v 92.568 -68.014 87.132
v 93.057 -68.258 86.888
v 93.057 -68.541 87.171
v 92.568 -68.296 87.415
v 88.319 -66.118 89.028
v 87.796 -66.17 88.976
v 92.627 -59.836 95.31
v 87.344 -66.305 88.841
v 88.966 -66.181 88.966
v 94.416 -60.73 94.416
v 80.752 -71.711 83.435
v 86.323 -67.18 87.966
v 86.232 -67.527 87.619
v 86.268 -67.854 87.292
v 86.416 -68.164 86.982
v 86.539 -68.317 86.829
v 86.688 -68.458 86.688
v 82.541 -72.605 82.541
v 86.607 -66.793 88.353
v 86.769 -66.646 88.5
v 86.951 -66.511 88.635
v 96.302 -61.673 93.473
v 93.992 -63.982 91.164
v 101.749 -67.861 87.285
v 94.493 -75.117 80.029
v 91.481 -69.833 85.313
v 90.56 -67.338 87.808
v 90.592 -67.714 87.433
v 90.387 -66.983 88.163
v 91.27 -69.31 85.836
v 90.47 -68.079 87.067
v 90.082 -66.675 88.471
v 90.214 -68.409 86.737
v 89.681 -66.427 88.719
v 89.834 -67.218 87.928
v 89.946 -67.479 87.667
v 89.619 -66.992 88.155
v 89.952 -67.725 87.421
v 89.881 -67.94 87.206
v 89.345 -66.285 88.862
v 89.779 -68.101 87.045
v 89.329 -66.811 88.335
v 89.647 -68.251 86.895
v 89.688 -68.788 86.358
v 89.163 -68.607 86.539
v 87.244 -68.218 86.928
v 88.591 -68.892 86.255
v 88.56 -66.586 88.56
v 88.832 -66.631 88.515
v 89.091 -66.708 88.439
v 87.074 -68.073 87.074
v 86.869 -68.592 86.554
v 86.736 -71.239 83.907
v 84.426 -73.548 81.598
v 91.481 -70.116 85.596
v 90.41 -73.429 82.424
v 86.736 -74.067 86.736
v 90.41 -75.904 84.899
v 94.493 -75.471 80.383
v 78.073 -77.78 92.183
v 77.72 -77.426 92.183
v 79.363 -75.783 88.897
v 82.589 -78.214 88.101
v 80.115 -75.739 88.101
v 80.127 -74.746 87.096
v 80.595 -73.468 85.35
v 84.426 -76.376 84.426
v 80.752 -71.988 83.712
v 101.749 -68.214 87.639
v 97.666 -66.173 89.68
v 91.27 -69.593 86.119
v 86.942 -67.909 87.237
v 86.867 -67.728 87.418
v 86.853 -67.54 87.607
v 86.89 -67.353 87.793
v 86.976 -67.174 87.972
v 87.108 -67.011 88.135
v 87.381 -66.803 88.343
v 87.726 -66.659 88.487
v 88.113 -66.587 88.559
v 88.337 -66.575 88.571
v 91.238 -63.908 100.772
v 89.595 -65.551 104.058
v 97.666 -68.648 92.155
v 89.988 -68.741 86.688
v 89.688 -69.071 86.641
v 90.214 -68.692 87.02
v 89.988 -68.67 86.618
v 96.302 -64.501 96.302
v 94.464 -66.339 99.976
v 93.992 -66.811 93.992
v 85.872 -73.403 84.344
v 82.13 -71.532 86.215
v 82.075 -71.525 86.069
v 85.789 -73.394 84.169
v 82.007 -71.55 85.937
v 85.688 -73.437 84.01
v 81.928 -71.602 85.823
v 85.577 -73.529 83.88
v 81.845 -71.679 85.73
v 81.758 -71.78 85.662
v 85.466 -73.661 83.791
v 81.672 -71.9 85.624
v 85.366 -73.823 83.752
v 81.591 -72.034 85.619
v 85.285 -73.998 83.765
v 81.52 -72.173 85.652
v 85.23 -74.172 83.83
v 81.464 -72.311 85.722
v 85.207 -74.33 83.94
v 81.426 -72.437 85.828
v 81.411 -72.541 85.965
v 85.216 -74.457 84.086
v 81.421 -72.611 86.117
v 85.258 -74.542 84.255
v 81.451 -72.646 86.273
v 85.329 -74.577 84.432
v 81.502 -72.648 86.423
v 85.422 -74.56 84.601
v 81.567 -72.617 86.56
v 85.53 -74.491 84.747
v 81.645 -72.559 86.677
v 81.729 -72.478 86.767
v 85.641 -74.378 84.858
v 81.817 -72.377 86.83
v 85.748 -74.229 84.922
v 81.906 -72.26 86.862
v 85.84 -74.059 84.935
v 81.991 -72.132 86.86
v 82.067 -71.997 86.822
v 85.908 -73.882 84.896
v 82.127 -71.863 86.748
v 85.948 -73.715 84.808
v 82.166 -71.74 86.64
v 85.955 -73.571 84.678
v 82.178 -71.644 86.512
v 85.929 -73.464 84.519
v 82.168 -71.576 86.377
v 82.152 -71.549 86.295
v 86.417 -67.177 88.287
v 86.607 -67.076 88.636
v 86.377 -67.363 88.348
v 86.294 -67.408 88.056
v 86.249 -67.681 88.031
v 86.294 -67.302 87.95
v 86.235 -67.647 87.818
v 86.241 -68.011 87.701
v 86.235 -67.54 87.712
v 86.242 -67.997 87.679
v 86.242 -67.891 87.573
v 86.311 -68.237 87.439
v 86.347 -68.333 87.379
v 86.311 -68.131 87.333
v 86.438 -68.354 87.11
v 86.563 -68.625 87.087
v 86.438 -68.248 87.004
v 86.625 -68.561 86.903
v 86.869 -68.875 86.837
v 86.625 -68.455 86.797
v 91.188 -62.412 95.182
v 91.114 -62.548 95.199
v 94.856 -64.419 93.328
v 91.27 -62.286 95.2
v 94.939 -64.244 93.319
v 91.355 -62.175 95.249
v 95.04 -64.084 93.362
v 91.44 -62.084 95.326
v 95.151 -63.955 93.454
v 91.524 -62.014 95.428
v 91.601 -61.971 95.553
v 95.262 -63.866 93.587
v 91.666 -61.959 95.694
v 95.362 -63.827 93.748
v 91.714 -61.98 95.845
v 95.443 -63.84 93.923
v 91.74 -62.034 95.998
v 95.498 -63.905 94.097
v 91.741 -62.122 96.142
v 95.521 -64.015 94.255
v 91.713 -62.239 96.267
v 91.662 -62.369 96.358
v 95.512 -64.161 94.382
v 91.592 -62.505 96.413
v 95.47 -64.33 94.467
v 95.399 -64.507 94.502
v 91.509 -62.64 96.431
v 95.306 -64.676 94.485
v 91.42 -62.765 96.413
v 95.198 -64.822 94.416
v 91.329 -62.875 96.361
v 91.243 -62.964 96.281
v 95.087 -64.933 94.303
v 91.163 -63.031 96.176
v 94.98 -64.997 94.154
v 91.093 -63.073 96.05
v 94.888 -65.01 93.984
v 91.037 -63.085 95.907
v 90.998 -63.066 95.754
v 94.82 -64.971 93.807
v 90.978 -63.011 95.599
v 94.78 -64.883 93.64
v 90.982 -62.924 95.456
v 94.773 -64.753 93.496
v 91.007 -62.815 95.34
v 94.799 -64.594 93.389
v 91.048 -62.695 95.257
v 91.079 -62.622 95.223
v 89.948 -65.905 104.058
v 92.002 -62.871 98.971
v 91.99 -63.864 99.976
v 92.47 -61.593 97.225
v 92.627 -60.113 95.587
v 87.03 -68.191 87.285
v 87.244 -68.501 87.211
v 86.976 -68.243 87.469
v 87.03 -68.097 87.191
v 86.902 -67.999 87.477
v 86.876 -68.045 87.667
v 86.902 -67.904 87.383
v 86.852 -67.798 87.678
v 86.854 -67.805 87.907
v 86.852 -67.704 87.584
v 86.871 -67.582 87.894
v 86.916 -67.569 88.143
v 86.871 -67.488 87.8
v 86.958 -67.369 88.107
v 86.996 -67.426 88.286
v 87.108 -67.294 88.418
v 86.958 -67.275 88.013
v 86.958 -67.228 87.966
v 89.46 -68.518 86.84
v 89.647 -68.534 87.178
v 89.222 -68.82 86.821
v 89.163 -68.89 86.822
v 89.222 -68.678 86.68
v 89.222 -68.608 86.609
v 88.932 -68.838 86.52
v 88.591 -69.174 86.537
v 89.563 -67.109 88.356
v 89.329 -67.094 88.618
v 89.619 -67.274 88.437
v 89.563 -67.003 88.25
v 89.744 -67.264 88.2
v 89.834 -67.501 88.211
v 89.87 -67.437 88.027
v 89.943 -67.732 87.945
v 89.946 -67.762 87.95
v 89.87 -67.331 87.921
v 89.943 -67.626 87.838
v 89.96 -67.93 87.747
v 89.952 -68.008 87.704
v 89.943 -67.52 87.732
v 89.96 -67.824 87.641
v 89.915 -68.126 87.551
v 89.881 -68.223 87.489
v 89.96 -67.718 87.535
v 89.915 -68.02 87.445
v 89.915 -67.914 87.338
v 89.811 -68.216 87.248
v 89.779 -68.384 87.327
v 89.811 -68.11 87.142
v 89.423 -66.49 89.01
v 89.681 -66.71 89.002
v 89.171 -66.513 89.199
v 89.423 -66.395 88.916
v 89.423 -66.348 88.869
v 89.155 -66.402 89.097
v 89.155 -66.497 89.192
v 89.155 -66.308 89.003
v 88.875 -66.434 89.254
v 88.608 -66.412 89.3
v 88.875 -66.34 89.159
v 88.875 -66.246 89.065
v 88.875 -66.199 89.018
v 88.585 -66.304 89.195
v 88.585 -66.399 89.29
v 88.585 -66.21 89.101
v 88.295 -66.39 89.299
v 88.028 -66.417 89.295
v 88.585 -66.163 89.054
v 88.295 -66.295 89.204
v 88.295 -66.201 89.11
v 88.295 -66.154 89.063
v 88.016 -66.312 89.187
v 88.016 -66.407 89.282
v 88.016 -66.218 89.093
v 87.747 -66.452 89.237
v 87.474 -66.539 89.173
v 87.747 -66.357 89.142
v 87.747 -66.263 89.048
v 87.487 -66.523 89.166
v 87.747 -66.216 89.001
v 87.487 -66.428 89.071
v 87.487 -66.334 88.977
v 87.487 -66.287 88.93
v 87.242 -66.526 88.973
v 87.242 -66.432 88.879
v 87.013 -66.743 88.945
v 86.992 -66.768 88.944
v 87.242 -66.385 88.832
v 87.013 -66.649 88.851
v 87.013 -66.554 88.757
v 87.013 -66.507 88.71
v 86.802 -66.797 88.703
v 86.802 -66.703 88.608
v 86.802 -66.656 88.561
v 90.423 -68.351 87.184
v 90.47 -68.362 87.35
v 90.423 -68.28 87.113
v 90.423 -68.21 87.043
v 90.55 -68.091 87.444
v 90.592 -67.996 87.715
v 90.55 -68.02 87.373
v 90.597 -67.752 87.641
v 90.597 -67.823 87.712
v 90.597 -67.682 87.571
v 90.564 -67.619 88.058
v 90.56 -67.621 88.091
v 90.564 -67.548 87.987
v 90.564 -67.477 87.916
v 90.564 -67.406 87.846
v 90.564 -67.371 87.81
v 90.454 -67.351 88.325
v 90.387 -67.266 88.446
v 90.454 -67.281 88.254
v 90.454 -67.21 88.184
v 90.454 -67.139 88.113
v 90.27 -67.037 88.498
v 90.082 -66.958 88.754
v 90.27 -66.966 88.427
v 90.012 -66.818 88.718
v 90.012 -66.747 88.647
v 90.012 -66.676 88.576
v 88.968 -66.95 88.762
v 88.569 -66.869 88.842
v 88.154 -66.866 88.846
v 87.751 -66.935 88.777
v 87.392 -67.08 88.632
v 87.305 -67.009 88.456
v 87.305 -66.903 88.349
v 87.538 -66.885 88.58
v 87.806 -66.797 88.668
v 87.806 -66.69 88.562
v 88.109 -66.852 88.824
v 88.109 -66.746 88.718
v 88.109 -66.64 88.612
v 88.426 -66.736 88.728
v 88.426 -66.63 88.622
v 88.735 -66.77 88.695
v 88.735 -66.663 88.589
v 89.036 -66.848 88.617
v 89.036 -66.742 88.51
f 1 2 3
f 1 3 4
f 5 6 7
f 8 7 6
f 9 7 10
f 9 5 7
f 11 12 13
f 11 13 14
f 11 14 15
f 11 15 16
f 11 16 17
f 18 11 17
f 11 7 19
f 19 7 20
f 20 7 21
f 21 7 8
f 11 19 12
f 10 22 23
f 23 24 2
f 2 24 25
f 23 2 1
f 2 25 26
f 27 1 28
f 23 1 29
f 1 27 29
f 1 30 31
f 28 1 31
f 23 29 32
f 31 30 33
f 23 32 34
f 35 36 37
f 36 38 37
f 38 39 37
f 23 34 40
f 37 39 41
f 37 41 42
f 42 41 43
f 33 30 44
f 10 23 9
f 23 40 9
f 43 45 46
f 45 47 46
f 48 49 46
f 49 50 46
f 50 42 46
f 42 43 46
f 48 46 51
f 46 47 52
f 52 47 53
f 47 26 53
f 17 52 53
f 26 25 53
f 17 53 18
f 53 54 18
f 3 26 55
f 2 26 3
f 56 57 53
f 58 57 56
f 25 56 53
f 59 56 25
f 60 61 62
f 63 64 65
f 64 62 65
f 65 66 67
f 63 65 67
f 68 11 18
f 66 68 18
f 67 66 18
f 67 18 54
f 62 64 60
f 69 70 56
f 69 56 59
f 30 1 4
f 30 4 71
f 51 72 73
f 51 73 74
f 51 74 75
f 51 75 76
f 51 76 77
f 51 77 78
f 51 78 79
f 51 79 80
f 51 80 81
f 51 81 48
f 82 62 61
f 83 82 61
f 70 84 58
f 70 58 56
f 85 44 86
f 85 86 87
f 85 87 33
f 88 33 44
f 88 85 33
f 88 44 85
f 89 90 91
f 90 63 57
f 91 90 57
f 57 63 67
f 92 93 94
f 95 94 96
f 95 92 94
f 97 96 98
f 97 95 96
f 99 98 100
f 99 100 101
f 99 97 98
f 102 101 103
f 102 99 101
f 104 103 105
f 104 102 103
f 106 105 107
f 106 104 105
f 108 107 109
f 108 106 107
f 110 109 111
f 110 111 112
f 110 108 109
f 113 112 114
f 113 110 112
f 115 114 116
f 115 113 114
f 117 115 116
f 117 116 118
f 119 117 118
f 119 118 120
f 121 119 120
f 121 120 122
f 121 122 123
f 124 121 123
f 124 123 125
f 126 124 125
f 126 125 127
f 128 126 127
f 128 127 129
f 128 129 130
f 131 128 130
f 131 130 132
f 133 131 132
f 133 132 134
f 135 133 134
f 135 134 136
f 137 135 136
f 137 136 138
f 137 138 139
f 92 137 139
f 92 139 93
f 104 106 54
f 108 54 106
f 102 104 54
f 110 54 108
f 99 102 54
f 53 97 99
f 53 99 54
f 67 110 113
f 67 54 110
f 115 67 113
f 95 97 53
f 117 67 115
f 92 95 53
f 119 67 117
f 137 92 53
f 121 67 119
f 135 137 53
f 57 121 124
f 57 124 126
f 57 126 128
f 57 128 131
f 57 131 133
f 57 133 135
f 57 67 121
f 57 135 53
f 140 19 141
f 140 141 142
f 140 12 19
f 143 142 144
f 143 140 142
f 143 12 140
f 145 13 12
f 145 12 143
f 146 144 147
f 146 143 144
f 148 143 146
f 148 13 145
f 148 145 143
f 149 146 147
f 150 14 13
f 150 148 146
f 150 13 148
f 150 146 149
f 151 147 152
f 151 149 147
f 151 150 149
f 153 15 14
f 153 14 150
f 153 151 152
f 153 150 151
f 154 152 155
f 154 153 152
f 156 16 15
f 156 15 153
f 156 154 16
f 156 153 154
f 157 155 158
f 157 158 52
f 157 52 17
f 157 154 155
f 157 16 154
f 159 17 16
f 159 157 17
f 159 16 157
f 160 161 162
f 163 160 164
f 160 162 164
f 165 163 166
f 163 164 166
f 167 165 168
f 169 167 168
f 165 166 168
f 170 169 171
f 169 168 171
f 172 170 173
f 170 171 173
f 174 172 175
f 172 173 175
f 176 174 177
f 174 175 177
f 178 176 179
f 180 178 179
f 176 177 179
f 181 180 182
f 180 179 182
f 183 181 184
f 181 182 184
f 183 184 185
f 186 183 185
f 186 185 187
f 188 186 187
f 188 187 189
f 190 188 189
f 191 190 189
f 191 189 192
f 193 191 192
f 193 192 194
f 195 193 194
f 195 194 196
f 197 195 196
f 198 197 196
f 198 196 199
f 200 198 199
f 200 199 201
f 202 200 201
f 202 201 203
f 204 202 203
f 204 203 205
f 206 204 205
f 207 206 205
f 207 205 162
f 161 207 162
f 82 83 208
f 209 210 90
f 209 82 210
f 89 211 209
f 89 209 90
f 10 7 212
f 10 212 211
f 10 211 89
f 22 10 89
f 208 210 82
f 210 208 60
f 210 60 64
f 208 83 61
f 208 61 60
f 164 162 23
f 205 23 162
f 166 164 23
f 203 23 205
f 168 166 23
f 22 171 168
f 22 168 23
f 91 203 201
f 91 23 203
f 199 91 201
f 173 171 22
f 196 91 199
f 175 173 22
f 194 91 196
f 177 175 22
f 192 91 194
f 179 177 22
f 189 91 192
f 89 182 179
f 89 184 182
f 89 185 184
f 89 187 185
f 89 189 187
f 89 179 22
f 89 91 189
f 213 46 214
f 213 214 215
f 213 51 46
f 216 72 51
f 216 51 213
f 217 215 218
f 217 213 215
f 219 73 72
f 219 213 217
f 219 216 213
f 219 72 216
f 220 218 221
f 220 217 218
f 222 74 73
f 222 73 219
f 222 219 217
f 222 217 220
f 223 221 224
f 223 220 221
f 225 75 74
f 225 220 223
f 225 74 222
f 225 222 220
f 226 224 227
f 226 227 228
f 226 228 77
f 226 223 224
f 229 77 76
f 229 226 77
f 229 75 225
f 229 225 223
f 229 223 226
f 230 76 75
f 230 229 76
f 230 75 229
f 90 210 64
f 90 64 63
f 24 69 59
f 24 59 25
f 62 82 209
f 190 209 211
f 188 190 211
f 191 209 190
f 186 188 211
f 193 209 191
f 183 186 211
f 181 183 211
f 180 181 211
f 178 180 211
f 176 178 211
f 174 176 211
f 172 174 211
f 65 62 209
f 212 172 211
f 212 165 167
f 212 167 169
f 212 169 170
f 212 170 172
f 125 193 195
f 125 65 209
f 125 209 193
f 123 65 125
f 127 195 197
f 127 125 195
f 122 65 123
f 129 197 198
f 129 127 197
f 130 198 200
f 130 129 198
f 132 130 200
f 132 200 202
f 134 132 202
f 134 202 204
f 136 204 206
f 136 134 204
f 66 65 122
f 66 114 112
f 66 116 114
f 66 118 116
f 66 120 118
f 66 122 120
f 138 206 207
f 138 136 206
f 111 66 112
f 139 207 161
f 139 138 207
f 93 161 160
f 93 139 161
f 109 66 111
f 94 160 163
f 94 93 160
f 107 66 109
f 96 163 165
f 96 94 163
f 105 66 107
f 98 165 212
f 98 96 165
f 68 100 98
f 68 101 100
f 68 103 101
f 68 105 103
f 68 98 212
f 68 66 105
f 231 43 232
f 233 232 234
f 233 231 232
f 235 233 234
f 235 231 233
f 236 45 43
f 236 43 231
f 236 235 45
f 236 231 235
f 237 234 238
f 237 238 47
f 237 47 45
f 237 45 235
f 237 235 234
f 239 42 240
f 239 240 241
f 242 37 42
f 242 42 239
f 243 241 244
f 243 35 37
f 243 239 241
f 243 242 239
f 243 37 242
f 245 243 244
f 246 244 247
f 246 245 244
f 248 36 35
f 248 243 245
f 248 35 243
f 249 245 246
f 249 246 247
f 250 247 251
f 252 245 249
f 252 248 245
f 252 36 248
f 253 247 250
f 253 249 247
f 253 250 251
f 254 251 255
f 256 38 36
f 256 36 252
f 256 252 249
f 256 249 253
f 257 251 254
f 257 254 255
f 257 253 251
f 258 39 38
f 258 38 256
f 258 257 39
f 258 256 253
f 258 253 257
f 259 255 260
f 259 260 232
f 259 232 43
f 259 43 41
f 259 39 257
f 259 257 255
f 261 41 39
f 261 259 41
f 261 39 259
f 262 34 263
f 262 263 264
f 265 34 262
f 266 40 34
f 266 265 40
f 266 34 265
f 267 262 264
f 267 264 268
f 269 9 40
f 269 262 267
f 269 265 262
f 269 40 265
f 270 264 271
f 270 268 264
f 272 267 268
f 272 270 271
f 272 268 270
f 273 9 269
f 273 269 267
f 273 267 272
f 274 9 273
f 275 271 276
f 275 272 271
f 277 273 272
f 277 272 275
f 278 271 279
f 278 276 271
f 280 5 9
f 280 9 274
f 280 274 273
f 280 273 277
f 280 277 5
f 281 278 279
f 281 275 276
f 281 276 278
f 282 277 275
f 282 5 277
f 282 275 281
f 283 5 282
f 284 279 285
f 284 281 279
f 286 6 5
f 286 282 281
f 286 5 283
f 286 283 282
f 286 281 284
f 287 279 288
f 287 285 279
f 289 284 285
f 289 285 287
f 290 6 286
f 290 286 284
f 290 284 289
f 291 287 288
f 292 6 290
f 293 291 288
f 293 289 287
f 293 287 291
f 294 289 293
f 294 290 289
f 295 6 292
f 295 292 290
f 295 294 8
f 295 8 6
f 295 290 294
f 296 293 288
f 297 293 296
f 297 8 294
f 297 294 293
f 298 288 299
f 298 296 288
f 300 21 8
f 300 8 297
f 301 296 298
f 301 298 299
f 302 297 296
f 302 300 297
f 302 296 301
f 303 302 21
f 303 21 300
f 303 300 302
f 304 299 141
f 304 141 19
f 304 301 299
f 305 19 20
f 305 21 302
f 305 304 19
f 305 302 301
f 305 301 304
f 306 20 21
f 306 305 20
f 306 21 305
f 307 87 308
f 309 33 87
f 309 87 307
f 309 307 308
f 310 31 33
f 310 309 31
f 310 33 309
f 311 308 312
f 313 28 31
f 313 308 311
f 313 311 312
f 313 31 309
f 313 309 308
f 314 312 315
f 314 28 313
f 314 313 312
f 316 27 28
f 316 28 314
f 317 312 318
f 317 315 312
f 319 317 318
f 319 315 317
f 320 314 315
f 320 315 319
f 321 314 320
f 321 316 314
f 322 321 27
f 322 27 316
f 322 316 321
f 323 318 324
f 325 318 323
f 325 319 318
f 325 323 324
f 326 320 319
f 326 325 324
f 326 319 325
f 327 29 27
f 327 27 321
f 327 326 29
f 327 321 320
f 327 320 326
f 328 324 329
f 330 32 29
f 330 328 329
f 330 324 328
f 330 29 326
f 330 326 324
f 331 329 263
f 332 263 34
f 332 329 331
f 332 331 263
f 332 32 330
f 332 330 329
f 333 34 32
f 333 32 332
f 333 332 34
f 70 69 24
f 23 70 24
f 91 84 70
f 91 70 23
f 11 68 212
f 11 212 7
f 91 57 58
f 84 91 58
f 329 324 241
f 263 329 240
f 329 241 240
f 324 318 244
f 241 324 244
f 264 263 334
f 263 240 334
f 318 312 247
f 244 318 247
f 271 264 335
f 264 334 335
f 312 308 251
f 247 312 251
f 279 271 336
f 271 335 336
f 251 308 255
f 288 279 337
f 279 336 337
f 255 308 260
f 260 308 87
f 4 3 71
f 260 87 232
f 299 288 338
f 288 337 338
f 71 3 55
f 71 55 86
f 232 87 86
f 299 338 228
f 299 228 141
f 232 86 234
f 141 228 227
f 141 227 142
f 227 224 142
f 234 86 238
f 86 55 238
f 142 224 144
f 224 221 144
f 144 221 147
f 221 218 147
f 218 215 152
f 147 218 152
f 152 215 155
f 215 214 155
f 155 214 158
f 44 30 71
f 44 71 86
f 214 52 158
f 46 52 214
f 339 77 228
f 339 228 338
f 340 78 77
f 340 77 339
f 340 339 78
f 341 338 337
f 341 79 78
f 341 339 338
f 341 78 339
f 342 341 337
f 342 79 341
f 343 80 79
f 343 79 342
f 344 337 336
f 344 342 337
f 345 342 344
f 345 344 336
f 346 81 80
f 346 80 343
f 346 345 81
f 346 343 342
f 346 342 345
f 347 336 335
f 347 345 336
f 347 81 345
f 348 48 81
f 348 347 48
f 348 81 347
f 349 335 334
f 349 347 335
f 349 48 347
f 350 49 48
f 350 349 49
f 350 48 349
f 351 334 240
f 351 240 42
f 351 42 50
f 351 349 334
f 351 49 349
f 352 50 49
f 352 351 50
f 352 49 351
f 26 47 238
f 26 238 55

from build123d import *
from build123d.topology import SkipClean

# Parameters (mm, degrees)
STOCK_GOUX_START         = 53.391336338
STOCK_GOUX_LIKED_1_DEPTH = 20.568134432
CUT_EXTRUDE1_DEPTH       = 109.511360444
BOSS_EXTRUDE1_DEPTH      = 20.568134
FILLET1_R                = 12.7
SKETCH3_R                = 0.64999997
CUT_EXTRUDE2_DEPTH       = 149.612005727
CUT_EXTRUDE3_DEPTH       = 0.4


# Read off the part's stored shape, not the designer's step: Stock-Goux Liked-1
with BuildPart() as part:
    # Stock-Goux Liked-1 outline → Stock-Goux Liked-1 (new body)
    with BuildSketch(Plane(origin=(0, 0, 0), x_dir=(0.8164965809277512, -0.4082482904637994, -0.40824829046387656), z_dir=(0.5773502691895902, 0.5773502691895891, 0.5773502691896982)).offset(STOCK_GOUX_START)):
        Polygon((57.433440297, -119.932119095), (57.866453013, -120.182119103), (60.366452966, -115.851992166), (63.397541976, -117.601992222), (65.647541921, -113.704878), (70.147541811, -113.704878), (70.147541811, -110.204877888), (75.147541717, -110.204877888), (75.147541717, -109.704877872), (63.338140771, -109.704877872), align=None)
    extrude(amount=STOCK_GOUX_LIKED_1_DEPTH)

    # Sketch1 → Cut-Extrude1 (cut, through all)
    with BuildSketch(Plane(origin=(0, -80.401490288, 80.401490288), x_dir=(1, 0, 0), z_dir=(0, -0.7071067811865477, 0.7071067811865475))):
        Polygon((84.426495932, 5.692217571), (86.735897009, 8.958203895), (94.492614361, 3.473376455), (92.183213285, 0.207390132), align=None)
        Polygon((96.301513883, 22.486029011), (104.058231236, 17.001201571), (101.748830159, 13.735215248), (93.992112807, 19.220042687), align=None)
    extrude(amount=-CUT_EXTRUDE1_DEPTH, mode=Mode.SUBTRACT)

    # Sketch2 → Boss-Extrude1 (add)
    with SkipClean():  # the faces are left unmerged after this step: merging them gives an invalid solid
        with BuildSketch(Plane(origin=(30.825502407, 30.825502407, 30.825502407), x_dir=(-0.40824829046391425, -0.4082482904639143, 0.8164965809276746), z_dir=(-0.5773502691895895, -0.5773502691895894, -0.5773502691896983))):
            Polygon((62.183440195, -111.704877936), (65.647541921, -113.704878), (67.897541921, -109.807763683), (64.433440195, -107.807763619), align=None)
        extrude(amount=-BOSS_EXTRUDE1_DEPTH)

    # Fillet1
    fillet1_edges = [part.edges().sort_by_distance(p)[0] for p in [
        (86.689770169, -68.456355976, 92.055619581),
    ]]
    fillet(fillet1_edges, radius=FILLET1_R)

    # Sketch3 → Cut-Extrude2 (cut, through all)
    with SkipClean():  # the faces are left unmerged after this step: merging them gives an invalid solid
        with BuildSketch(Plane(origin=(53.600993525, -26.800496763, -26.800496763), x_dir=(-0.36514837167009556, 0.18257418583503127, -0.9128709291752878), z_dir=(0.8164965809277506, -0.40824829046383865, -0.4082482904638387))):
            with Locations(Location((-132.231040931, -15.066915515, 0), (0, 0, 348.463040967))):
                Circle(SKETCH3_R)
        cut_extrude2 = extrude(amount=-CUT_EXTRUDE2_DEPTH, mode=Mode.SUBTRACT)

    # Mirror1: Cut-Extrude2 across plane
    with SkipClean():  # the faces are left unmerged after this step: merging them gives an invalid solid
        add(cut_extrude2.mirror(Plane(origin=(36.763011383, 36.763011383, 36.763011383), x_dir=(-0.40824829046390154, -0.40824829046390165, 0.8164965809276874), z_dir=(0.5773502691895985, 0.5773502691895986, 0.5773502691896802))), mode=Mode.SUBTRACT)

    # Sketch4 → Cut-Extrude3 (cut)
    with SkipClean():  # the faces are left unmerged after this step: merging them gives an invalid solid
        with BuildSketch(Plane(origin=(0, -77.573063073, 77.573063073), x_dir=(1, 0, 0), z_dir=(0, 0.7071067811865477, -0.7071067811865475))):
            with BuildLine():
                Line((93.057379032, -13.173091082), (92.567645459, -13.519084672))
                Line((92.567645459, -13.519084672), (91.270169497, -11.686081867))
                Line((91.270169497, -11.686081867), (89.687757638, -12.423862316))
                add(Edge.make_bspline(
                    [(89.687757638, -12.423862316), (89.741295568, -12.46776154), (89.844942898, -12.552748714), (89.986729771, -12.686351444), (90.109493379, -12.820951582), (90.180253462, -12.914346072), (90.214380234, -12.959389159)],
                    knots=[0, 0, 0, 0, 1.102510947, 2.134417912, 3.100251258, 4, 4, 4, 4], degree=3))
                add(Edge.make_bspline(
                    [(90.214380234, -12.959389159), (90.253760272, -13.017586925), (90.331220007, -13.132060751), (90.424525722, -13.313424806), (90.499954525, -13.496549573), (90.552853451, -13.683170388), (90.588524358, -13.872165751), (90.600192512, -14.064230957), (90.594316704, -14.258572886), (90.567052813, -14.453627198), (90.522232401, -14.646119682), (90.456443819, -14.831644428), (90.37370764, -15.009053992), (90.272718514, -15.178186861), (90.151902914, -15.337992616), (90.012792553, -15.489286627), (89.855636039, -15.632722917), (89.740254809, -15.718962844), (89.681397462, -15.762954864)],
                    knots=[0, 0, 0, 0, 1.053566777, 2.072344485, 3.054154547, 4.020735706, 4.977911009, 5.934388254, 6.901994919, 7.890871114, 8.884708514, 9.862655974, 10.838946315, 11.817700602, 12.812779523, 13.839512687, 14.897909552, 16, 16, 16, 16], degree=3))
                add(Edge.make_bspline(
                    [(89.681397462, -15.762954864), (89.638861949, -15.79180454), (89.554795968, -15.84882222), (89.424554492, -15.926036449), (89.290895408, -15.991410287), (89.155300895, -16.049553503), (89.016642135, -16.097655089), (88.875174038, -16.137099385), (88.731270115, -16.168140221), (88.585356233, -16.187761829), (88.439700765, -16.199777545), (88.296040345, -16.200730613), (88.155005398, -16.193081949), (88.016337233, -16.176925914), (87.879820972, -16.150143257), (87.746101629, -16.112905095), (87.614836668, -16.066952156), (87.486042986, -16.012633338), (87.36135061, -15.94736132), (87.240735277, -15.873163467), (87.122735013, -15.792270246), (87.011070103, -15.699661066), (86.902568847, -15.599581488), (86.800066565, -15.489353904), (86.699506263, -15.37226378), (86.638126187, -15.288079908), (86.606888247, -15.245236515)],
                    knots=[0, 0, 0, 0, 1.059045057, 2.093066608, 3.116885153, 4.123102215, 5.131744447, 6.138757912, 7.148156815, 8.162686115, 9.170608983, 10.158022319, 11.120612269, 12.079785529, 13.032569554, 13.984391495, 14.937776329, 15.896949589, 16.862272095, 17.834843879, 18.814104655, 19.80760772, 20.82157244, 21.85385735, 22.907771379, 24, 24, 24, 24], degree=3))
                add(Edge.make_bspline(
                    [(86.606888247, -15.245236515), (86.571580982, -15.193252636), (86.502142451, -15.091016336), (86.41618388, -14.93004522), (86.344744771, -14.767482877), (86.292163209, -14.601805216), (86.252344887, -14.434043372), (86.233224181, -14.263324381), (86.227400474, -14.090507286), (86.239494355, -13.916834049), (86.265515908, -13.744722824), (86.30797018, -13.577552607), (86.364080119, -13.416020283), (86.435375705, -13.260390942), (86.522836864, -13.111119621), (86.623492387, -12.96724671), (86.738046259, -12.828566566), (86.824857153, -12.744064342), (86.86892751, -12.701166002)],
                    knots=[0, 0, 0, 0, 1.073683973, 2.111606131, 3.114875596, 4.105229039, 5.079452871, 6.057740752, 7.036807216, 8.032083212, 9.029653356, 10.008961322, 10.976446223, 11.949563641, 12.930560464, 13.930051518, 14.949171403, 16, 16, 16, 16], degree=3))
                Line((86.86892751, -12.701166002), (87.244177911, -13.230332668))
                add(Edge.make_bspline(
                    [(87.244177911, -13.230332668), (87.203630602, -13.274365386), (87.125511073, -13.359199998), (87.030245223, -13.496920616), (86.953711988, -13.633102202), (86.89891325, -13.771272529), (86.866072042, -13.912811297), (86.849115424, -14.058372065), (86.851210509, -14.209486442), (86.86900954, -14.363314897), (86.902300542, -14.516992644), (86.955818974, -14.664132133), (87.020988019, -14.806766078), (87.078858378, -14.893581403), (87.108070138, -14.937403982)],
                    knots=[0, 0, 0, 0, 1.151825873, 2.219138558, 3.21719232, 4.156104017, 5.071411429, 6.008616142, 6.972493179, 7.975548077, 8.988201805, 9.993150609, 10.986983969, 12, 12, 12, 12], degree=3))
                add(Edge.make_bspline(
                    [(87.108070138, -14.937403982), (87.138555874, -14.978424636), (87.19858351, -15.059195946), (87.303110462, -15.166361235), (87.415414903, -15.261227558), (87.537005465, -15.343065931), (87.667525961, -15.411983911), (87.80637932, -15.468149642), (87.954429953, -15.510207129), (88.109024438, -15.538668693), (88.267373598, -15.554853821), (88.425830222, -15.552517547), (88.58235856, -15.538339817), (88.736728883, -15.505941209), (88.888199475, -15.456572805), (89.039090754, -15.394670176), (89.187152138, -15.315407609), (89.281232645, -15.252012671), (89.329043696, -15.219795809)],
                    knots=[0, 0, 0, 0, 0.982901861, 1.935373165, 2.873857243, 3.808820726, 4.750847603, 5.710288131, 6.686831843, 7.708192972, 8.733167937, 9.745322852, 10.754049183, 11.754552243, 12.77418333, 13.817071584, 14.890651141, 16, 16, 16, 16], degree=3))
                add(Edge.make_bspline(
                    [(89.329043696, -15.219795809), (89.37068488, -15.188638571), (89.452236147, -15.127619358), (89.563587258, -15.026915322), (89.660802629, -14.919270083), (89.74548165, -14.805974644), (89.815581792, -14.685946996), (89.872085801, -14.560060608), (89.915042433, -14.428675913), (89.946372379, -14.292531636), (89.960656297, -14.1529597), (89.963134707, -14.01262796), (89.946603574, -13.872900372), (89.917624638, -13.733424144), (89.872568669, -13.594113504), (89.812188994, -13.455718618), (89.738492589, -13.316631534), (89.678065145, -13.22849889), (89.64705251, -13.183267364)],
                    knots=[0, 0, 0, 0, 1.074728317, 2.104778202, 3.097685251, 4.068882731, 5.023484141, 5.965079531, 6.915809939, 7.876988247, 8.846879582, 9.811090509, 10.772268818, 11.748712747, 12.75216451, 13.792604211, 14.867118046, 16, 16, 16, 16], degree=3))
                add(Edge.make_bspline(
                    [(89.64705251, -13.183267364), (89.618173393, -13.145235048), (89.558752843, -13.066981231), (89.459652489, -12.952007275), (89.34552654, -12.839732315), (89.220663354, -12.725514625), (89.081587528, -12.612997782), (88.930468675, -12.499599482), (88.765496982, -12.387822996), (88.650403504, -12.314998695), (88.591263247, -12.277578261)],
                    knots=[0, 0, 0, 0, 0.818651868, 1.684426275, 2.599403717, 3.561756698, 4.584719662, 5.664970434, 6.800155744, 8, 8, 8, 8], degree=3))
                Line((88.591263247, -12.277578261), (91.48132735, -10.945757348))
                Line((91.48132735, -10.945757348), (93.057379032, -13.173091082))
            make_face()
        extrude(amount=-CUT_EXTRUDE3_DEPTH, mode=Mode.SUBTRACT)


solid = part.part
